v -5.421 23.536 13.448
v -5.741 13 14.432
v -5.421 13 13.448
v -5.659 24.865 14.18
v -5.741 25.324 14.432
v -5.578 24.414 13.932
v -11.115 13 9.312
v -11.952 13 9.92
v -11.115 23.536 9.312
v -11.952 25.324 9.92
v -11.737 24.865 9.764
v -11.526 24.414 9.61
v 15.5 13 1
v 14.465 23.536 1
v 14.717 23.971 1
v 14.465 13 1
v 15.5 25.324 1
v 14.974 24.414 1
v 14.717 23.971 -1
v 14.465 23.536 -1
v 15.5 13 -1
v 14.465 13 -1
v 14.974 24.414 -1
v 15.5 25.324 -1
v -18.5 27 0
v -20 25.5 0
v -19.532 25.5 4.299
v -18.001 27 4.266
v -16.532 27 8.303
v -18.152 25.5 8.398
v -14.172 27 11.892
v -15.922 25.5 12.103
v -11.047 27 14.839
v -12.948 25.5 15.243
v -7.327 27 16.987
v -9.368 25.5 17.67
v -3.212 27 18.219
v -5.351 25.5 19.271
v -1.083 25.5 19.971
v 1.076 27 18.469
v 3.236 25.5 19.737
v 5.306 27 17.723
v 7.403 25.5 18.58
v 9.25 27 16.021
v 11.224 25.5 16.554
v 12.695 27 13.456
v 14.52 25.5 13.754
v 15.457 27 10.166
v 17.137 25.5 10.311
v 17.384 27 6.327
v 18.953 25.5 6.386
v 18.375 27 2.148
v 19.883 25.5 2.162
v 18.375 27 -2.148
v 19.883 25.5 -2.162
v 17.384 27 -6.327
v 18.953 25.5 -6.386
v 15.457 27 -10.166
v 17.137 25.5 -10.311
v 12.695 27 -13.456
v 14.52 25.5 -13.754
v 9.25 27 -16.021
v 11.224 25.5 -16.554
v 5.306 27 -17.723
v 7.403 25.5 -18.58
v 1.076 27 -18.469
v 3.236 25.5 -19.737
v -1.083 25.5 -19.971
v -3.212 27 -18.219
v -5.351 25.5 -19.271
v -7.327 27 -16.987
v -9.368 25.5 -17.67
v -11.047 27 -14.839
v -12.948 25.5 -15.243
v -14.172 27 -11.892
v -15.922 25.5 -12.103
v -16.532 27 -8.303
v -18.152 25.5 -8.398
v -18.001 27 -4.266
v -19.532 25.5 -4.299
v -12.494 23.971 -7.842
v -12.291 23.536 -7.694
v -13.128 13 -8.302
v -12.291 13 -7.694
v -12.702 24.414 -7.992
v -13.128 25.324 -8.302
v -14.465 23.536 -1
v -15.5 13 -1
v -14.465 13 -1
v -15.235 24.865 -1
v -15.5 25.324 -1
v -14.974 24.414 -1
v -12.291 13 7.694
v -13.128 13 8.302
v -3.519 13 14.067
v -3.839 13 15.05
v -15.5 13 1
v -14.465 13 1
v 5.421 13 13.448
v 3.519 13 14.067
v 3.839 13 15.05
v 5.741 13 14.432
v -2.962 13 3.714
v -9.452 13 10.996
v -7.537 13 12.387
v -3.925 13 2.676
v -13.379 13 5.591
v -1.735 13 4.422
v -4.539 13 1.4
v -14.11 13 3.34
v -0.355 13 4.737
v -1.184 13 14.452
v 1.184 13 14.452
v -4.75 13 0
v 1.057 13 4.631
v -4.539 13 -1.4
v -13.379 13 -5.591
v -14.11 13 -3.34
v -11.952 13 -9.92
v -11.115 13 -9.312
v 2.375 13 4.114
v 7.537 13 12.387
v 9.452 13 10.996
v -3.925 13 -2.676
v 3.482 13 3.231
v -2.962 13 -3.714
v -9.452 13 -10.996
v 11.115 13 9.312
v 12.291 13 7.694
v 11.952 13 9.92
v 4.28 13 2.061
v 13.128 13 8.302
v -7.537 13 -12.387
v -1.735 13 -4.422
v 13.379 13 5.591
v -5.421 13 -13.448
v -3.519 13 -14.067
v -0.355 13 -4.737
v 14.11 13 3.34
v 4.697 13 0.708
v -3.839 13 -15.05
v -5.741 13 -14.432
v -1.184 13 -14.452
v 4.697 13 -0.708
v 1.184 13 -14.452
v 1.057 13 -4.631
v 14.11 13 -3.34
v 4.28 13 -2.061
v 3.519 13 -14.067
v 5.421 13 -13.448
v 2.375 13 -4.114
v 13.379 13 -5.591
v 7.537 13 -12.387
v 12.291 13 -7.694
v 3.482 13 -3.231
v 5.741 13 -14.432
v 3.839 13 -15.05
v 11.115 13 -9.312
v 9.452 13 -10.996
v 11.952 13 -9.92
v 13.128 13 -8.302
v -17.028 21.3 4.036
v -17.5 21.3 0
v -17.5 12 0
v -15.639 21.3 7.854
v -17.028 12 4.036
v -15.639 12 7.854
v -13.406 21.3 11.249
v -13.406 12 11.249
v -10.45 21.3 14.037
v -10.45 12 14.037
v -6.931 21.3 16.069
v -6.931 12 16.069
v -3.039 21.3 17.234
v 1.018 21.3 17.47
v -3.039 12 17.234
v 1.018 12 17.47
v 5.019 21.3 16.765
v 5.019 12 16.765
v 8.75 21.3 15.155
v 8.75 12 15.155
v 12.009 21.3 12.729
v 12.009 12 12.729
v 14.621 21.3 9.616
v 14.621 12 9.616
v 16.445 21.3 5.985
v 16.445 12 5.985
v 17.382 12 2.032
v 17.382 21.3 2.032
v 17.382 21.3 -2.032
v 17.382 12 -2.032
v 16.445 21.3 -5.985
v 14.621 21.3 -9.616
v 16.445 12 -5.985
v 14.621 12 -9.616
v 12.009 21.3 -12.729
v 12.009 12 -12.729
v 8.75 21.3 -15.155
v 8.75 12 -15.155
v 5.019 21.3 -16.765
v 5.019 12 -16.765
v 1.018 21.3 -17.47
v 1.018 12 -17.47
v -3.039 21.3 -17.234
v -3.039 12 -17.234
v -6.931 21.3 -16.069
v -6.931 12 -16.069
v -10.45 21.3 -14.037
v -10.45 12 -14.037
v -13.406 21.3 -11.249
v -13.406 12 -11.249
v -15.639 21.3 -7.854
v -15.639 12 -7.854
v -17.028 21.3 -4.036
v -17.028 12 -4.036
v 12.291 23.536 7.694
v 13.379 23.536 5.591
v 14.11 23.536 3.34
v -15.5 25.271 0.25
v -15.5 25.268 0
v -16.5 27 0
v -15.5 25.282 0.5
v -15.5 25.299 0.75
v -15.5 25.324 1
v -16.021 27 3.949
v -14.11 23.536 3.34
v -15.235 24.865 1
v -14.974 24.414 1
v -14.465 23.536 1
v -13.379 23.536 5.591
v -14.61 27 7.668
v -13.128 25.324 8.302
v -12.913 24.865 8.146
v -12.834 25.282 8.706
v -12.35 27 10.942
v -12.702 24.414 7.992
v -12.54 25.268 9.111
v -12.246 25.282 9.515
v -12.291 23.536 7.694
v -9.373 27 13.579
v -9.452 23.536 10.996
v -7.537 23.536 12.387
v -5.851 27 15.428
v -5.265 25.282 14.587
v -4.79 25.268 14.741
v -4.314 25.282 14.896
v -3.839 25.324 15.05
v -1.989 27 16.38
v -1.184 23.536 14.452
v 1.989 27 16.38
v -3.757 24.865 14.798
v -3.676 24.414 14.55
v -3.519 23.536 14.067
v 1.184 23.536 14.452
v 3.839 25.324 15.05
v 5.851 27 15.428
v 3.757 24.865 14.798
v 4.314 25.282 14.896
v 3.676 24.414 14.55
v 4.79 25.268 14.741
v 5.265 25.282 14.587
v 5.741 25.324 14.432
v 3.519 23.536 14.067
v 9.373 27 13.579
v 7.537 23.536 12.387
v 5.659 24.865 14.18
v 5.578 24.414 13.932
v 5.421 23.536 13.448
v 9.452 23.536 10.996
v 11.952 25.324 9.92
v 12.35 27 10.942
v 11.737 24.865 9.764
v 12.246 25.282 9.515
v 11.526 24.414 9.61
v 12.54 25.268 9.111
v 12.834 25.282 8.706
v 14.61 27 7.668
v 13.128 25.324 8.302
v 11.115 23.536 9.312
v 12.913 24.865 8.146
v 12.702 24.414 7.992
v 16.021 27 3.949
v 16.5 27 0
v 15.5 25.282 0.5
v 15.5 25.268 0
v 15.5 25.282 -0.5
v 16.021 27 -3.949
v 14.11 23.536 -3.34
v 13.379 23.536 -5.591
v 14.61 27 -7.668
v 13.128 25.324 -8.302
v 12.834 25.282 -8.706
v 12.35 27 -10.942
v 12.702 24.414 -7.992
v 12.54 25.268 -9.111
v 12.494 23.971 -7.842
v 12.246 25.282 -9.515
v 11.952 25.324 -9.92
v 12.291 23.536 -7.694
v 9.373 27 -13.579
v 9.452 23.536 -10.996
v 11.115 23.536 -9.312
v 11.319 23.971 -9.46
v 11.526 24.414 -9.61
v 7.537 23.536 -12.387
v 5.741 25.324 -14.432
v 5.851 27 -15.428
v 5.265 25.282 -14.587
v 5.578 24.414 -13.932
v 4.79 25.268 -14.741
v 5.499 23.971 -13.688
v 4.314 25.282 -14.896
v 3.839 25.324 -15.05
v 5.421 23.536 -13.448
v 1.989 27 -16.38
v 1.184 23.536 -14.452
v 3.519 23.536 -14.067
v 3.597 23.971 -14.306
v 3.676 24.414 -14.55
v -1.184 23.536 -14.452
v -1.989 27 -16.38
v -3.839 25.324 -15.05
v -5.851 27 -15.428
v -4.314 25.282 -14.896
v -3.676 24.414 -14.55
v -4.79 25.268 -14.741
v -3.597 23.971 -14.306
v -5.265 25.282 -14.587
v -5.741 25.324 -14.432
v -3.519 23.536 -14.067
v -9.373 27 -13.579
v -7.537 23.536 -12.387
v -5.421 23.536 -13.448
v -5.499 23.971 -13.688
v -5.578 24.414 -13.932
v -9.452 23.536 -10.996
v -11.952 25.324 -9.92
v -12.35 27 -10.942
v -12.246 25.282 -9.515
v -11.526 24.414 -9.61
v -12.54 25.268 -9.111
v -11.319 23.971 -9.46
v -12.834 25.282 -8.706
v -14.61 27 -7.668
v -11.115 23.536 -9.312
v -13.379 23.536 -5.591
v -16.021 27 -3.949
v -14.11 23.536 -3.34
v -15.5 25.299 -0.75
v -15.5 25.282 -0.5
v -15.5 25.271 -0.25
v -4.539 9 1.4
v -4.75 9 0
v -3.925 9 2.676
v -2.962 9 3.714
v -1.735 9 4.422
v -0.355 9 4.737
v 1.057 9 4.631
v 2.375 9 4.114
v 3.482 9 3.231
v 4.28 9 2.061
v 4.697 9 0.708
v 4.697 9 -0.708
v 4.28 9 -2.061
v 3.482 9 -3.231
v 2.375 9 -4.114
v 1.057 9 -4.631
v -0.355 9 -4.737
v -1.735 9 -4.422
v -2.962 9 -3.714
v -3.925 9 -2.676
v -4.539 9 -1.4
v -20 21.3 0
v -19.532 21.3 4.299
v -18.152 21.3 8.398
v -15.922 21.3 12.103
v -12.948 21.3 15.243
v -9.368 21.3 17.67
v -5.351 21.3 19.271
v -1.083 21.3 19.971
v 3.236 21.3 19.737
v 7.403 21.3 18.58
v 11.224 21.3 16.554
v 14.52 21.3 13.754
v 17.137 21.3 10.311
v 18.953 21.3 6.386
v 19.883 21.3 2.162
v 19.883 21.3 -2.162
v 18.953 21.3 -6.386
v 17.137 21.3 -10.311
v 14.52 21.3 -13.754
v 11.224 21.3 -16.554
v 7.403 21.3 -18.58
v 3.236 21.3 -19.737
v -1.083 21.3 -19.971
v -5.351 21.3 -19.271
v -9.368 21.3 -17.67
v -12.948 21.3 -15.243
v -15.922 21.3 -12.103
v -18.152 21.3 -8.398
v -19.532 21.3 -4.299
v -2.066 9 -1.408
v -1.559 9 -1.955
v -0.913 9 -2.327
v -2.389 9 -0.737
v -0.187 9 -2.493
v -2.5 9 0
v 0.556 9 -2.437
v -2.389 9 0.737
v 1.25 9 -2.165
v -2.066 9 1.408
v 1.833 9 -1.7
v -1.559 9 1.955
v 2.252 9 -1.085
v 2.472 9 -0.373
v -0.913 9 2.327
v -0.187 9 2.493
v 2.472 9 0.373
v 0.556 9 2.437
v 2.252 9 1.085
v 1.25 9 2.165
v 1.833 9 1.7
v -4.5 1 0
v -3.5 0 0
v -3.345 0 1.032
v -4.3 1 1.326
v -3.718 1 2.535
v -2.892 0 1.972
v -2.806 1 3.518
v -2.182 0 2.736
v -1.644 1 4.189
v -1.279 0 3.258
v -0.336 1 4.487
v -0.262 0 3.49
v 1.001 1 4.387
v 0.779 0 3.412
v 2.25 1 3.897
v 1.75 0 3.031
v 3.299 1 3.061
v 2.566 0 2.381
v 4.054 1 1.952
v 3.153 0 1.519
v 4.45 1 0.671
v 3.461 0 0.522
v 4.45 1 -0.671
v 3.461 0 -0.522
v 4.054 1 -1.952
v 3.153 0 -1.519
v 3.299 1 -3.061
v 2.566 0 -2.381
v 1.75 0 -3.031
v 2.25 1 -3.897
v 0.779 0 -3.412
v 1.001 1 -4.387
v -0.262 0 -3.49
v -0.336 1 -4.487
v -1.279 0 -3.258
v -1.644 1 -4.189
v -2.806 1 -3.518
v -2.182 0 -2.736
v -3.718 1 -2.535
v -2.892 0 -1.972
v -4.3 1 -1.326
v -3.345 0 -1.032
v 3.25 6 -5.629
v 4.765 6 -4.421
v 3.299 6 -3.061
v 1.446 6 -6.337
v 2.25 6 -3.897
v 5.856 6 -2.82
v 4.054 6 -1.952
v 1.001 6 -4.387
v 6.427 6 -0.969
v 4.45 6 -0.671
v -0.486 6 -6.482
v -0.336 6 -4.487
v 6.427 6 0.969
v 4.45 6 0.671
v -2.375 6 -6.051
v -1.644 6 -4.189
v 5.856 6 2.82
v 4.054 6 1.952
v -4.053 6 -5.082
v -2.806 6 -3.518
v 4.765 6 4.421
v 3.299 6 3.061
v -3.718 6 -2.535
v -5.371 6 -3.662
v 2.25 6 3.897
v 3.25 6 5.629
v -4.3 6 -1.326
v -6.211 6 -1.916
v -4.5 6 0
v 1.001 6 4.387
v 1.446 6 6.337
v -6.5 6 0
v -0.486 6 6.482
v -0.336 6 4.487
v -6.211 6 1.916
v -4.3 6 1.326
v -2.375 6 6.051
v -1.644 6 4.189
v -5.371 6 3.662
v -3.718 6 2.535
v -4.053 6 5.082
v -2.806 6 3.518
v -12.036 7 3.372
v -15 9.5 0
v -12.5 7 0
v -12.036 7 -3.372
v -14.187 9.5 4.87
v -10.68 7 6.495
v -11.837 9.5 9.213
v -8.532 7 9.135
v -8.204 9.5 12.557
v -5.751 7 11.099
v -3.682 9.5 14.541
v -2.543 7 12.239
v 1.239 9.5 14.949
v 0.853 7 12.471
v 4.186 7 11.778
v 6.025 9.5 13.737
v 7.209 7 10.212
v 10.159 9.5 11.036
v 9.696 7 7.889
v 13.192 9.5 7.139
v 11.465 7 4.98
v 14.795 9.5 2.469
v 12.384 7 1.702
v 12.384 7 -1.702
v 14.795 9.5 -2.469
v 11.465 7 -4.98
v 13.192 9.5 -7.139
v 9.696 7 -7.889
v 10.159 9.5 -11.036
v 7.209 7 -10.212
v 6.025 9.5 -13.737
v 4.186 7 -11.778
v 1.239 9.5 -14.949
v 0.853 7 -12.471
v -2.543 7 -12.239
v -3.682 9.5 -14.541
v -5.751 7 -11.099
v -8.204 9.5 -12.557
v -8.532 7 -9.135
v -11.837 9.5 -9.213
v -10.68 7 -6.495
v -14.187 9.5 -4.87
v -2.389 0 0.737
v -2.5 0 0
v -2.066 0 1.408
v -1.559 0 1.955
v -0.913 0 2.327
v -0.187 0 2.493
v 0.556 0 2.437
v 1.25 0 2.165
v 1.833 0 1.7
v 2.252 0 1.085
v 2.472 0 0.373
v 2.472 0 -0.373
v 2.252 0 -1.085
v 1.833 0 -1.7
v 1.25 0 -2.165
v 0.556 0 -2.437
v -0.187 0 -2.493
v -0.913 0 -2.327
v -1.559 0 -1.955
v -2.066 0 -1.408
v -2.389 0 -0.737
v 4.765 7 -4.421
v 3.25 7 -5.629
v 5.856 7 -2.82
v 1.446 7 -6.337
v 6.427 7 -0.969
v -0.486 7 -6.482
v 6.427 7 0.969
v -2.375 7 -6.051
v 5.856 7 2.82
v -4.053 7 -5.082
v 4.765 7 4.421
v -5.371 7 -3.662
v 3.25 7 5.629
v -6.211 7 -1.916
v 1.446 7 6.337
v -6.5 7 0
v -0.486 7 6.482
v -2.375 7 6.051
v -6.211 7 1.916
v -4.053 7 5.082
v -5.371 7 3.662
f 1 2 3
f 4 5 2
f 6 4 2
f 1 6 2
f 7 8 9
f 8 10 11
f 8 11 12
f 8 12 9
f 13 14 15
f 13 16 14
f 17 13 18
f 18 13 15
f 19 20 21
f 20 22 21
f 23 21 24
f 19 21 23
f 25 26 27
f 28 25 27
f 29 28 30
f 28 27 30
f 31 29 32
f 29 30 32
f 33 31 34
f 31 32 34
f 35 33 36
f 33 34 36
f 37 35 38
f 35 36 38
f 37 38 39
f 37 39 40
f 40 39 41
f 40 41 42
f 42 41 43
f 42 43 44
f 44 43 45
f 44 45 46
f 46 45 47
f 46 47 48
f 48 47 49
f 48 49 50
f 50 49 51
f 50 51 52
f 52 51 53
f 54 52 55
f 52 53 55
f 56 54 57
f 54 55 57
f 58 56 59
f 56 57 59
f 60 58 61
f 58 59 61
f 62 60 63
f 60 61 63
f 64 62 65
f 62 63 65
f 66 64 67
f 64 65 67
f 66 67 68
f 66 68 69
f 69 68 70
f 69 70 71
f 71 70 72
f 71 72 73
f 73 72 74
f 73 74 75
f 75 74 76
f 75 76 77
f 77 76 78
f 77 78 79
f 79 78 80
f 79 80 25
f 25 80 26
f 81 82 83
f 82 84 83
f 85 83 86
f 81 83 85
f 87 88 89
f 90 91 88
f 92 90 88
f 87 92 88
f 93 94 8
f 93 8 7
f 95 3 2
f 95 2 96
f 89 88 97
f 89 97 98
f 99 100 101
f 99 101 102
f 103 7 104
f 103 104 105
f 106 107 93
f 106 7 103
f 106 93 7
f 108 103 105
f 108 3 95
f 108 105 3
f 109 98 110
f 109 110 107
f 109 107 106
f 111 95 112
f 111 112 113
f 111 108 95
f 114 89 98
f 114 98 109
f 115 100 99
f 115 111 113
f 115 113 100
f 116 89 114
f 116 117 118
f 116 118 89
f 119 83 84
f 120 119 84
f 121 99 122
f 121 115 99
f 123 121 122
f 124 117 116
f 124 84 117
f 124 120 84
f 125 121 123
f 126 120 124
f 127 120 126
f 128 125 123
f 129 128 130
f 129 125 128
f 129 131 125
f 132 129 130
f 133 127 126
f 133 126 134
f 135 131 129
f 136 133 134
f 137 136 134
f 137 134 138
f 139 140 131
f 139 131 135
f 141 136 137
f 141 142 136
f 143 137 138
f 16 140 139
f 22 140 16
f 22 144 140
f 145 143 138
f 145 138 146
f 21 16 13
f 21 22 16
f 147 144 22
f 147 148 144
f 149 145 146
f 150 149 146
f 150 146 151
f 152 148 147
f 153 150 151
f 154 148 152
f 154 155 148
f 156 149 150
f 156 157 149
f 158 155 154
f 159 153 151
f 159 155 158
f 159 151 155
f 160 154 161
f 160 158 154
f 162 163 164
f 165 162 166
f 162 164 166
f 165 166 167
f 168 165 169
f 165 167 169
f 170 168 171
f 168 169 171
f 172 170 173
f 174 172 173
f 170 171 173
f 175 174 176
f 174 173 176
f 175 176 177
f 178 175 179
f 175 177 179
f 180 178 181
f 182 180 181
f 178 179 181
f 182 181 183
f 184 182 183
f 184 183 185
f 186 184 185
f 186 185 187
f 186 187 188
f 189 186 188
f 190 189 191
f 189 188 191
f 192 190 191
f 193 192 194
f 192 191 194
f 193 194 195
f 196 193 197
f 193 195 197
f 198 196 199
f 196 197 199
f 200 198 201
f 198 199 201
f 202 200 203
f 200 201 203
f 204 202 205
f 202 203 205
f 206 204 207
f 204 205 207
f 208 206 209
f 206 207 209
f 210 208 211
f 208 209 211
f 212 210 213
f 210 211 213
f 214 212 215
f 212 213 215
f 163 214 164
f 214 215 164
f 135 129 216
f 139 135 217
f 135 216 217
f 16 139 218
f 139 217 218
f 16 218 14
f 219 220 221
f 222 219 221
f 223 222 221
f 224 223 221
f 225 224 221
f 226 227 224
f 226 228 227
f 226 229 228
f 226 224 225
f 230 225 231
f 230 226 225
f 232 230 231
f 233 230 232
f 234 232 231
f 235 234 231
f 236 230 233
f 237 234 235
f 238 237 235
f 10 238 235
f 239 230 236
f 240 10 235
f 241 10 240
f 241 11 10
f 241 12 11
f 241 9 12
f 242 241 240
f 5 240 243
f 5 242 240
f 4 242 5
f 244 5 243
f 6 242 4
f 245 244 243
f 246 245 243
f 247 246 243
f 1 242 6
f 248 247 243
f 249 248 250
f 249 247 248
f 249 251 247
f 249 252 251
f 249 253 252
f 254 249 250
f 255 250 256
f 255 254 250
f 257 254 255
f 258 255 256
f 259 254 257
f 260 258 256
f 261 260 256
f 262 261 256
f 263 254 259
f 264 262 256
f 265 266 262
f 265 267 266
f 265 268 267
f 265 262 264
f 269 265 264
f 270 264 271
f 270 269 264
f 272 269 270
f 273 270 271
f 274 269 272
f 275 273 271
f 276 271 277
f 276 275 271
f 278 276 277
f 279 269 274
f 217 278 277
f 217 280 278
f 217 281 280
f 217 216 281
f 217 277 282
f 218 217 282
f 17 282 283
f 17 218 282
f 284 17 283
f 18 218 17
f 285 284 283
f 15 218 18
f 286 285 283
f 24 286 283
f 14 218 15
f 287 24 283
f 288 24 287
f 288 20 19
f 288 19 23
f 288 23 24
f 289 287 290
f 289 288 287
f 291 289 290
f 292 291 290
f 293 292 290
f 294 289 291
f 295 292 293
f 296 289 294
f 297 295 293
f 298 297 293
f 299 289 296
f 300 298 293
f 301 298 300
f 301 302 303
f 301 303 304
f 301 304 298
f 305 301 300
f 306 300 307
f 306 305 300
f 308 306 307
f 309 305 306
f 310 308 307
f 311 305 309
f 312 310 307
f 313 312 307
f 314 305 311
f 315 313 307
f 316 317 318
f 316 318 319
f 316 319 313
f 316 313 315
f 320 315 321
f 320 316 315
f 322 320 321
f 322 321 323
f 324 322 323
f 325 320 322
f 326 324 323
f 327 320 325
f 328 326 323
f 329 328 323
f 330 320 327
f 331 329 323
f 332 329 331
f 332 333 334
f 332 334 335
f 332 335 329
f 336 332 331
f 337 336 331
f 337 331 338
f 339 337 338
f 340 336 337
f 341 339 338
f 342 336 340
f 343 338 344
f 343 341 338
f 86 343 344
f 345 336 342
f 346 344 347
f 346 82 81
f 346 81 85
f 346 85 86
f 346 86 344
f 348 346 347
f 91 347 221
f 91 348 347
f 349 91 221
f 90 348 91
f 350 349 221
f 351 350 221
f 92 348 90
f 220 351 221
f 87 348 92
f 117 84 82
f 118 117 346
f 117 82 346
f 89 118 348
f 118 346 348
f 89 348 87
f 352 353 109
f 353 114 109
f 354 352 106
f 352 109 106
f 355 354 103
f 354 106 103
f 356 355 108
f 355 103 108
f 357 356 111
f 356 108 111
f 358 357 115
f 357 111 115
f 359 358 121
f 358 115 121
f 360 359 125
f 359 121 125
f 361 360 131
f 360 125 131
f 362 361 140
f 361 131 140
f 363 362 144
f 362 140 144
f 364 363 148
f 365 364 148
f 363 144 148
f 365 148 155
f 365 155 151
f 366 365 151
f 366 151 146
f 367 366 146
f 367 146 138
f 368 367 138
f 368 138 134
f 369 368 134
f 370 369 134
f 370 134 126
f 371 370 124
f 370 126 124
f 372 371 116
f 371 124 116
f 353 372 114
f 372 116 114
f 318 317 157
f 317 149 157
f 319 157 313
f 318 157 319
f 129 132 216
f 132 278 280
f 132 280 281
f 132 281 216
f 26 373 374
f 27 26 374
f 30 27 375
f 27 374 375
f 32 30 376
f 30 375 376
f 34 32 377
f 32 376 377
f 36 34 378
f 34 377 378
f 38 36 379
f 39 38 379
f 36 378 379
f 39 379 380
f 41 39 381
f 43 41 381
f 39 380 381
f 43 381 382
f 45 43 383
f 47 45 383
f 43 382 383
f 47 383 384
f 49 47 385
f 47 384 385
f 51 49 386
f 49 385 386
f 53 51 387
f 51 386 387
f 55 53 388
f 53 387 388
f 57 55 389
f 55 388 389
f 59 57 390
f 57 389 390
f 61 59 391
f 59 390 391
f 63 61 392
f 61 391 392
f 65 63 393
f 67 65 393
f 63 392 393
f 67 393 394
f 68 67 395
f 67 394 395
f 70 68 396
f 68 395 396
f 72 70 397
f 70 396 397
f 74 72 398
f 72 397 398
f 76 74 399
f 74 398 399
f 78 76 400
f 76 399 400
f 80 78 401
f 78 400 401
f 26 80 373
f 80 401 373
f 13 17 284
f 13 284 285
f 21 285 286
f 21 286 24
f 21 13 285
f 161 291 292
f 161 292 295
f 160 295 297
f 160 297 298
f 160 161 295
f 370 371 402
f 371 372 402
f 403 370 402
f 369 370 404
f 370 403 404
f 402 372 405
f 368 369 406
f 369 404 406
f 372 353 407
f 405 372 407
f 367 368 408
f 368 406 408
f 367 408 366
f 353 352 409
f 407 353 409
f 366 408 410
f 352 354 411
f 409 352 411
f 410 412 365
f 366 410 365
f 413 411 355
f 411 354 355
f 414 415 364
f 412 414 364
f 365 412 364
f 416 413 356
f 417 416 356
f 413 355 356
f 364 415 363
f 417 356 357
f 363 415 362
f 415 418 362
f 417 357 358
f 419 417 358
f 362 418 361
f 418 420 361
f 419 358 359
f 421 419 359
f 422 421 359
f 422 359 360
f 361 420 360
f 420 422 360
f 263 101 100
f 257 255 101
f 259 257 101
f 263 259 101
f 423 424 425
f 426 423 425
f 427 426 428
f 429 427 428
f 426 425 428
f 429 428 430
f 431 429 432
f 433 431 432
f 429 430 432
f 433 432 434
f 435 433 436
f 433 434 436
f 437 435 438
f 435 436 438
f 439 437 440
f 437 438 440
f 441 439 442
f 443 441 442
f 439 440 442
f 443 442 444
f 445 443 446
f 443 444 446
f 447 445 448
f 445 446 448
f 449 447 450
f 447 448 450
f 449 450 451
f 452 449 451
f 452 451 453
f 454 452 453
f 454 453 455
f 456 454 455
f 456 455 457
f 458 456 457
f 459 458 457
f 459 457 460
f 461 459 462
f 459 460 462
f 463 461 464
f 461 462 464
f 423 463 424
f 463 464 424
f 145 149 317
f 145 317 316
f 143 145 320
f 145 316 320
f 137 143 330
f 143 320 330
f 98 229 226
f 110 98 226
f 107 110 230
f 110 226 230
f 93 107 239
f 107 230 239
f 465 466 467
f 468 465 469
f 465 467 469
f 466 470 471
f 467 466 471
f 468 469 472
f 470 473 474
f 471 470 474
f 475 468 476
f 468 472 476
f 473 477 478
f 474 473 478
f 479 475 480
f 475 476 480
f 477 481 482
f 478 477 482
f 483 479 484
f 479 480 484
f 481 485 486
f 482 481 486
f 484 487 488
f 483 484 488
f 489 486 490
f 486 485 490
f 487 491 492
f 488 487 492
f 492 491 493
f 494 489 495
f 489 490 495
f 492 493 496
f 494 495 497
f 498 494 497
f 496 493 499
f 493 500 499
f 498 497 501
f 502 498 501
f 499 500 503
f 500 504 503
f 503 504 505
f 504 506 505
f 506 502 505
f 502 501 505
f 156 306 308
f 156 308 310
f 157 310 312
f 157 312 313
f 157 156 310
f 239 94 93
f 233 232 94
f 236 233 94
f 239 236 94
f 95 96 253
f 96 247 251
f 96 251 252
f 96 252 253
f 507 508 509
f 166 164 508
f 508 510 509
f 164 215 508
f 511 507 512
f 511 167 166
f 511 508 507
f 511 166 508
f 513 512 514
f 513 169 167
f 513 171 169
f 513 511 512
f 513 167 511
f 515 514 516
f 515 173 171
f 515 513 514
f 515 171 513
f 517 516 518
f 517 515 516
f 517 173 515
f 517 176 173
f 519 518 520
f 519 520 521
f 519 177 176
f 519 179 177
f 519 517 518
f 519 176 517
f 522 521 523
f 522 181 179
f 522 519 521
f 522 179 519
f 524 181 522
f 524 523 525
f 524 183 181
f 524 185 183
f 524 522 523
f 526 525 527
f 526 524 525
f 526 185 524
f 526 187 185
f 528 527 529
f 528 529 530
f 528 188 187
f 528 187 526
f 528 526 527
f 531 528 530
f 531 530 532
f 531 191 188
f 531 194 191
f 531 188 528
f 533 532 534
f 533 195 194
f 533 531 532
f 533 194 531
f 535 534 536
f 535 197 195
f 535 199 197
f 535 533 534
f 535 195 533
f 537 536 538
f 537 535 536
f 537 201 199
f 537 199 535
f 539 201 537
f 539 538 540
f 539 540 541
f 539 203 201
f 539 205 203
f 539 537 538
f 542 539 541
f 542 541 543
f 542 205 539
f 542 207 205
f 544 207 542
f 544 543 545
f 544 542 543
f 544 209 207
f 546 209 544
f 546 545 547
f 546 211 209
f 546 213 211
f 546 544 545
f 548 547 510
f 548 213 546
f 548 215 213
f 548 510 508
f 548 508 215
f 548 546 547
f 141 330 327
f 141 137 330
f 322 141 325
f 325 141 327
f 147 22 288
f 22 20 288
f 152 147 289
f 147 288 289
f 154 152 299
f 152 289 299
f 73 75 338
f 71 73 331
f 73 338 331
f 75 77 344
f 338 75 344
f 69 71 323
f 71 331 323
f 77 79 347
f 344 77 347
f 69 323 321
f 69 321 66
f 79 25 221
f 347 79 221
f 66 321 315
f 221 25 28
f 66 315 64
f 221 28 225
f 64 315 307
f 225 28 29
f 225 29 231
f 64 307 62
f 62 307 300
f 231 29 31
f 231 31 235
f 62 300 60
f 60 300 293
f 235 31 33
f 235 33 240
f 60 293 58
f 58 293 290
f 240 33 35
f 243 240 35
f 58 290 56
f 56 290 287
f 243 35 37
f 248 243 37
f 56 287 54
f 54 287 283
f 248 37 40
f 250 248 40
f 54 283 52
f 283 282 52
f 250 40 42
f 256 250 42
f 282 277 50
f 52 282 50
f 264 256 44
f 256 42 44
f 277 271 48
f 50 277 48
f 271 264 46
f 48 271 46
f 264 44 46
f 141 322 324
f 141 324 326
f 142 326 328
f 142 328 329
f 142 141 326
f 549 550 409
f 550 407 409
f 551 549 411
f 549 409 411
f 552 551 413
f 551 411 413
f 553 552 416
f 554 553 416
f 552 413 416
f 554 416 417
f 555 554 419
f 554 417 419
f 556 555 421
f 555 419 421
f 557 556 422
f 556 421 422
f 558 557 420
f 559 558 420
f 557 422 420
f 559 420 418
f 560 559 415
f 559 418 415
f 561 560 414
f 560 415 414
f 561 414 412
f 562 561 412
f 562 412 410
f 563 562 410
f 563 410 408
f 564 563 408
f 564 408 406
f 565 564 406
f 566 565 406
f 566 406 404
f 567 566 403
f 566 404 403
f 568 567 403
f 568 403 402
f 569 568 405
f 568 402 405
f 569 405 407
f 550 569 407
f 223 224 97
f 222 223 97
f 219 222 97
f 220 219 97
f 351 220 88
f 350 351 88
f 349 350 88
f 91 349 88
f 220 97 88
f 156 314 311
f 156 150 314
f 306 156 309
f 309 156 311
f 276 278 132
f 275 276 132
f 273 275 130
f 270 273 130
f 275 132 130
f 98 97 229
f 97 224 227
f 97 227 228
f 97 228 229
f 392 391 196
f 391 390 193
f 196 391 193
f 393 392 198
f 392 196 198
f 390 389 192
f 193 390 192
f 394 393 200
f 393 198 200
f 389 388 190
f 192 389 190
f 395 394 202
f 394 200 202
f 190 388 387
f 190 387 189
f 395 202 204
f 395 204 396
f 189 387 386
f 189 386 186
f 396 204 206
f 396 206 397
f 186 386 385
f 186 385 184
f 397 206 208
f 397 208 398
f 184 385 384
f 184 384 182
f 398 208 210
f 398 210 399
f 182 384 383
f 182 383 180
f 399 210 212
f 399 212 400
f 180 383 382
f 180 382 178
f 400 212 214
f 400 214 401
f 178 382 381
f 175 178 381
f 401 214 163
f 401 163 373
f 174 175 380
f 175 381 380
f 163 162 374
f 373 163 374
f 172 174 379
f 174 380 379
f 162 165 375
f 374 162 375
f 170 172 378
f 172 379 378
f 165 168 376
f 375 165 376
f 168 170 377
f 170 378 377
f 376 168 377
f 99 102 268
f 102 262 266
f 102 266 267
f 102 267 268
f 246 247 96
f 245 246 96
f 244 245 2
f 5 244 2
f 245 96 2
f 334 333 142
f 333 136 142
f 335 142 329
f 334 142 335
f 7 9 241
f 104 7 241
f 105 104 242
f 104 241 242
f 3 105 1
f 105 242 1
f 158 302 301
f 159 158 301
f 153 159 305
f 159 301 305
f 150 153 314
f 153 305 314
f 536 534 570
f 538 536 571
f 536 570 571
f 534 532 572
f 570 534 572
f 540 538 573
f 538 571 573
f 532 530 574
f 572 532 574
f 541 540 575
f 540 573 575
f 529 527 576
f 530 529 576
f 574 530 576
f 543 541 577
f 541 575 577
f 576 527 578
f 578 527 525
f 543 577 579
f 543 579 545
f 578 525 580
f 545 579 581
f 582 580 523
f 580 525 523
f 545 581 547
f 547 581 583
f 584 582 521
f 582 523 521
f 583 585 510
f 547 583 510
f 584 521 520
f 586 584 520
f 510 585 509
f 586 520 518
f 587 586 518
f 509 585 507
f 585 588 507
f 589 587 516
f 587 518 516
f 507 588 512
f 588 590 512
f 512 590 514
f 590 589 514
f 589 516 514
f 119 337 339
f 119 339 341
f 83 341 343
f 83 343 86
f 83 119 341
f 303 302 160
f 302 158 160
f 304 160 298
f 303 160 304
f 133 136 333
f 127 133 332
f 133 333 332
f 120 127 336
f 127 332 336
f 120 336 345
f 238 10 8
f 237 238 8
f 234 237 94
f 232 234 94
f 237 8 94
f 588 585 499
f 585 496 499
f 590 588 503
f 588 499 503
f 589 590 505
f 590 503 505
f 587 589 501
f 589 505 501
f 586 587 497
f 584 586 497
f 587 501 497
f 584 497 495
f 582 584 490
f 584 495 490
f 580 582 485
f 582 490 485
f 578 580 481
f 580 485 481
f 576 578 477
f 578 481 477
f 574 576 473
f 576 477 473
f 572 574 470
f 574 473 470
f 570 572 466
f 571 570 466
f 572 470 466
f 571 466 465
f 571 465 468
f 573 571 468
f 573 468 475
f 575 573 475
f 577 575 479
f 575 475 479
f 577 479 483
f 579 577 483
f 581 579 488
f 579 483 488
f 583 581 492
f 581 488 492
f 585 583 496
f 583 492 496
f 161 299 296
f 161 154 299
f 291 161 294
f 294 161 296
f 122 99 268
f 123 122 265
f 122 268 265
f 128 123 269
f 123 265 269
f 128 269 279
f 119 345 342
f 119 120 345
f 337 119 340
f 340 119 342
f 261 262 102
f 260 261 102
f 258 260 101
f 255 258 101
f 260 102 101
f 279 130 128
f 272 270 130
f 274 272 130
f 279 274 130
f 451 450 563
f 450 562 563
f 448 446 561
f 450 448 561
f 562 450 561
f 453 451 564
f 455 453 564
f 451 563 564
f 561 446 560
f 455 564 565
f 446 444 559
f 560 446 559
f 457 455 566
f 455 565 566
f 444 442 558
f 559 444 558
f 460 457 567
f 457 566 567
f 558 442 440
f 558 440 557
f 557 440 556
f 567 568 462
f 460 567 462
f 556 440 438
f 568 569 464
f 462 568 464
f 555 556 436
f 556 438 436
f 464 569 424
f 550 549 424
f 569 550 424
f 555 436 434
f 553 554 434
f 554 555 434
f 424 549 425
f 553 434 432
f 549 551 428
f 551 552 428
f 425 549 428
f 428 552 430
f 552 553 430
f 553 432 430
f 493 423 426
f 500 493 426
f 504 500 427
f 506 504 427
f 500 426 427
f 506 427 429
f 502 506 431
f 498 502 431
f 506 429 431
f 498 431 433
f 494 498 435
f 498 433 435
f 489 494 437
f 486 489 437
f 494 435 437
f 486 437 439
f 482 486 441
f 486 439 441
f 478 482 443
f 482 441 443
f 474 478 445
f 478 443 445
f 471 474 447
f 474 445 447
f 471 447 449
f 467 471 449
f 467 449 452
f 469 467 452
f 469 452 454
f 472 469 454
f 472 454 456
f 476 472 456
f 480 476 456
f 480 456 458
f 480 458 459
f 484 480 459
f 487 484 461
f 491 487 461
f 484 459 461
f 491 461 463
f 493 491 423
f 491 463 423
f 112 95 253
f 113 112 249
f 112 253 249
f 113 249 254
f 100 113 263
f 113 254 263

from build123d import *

# Parameters (mm, degrees)
CHAMFER1_SIZE      = 2
CHAMFER1_SIZE2     = 3.464101615
CHAMFER2_SIZE      = 1.5
SKETCH2_W          = 31
SKETCH2_H          = 2
CUT_EXTRUDE1_DEPTH = 15
CIRPATTERN1_COUNT  = 10
CHAMFER3_SIZE      = 5
CHAMFER4_SIZE      = 1


with BuildPart() as part:
    # Sketch1 → Revolve1 (revolve)
    with BuildSketch(Plane.XY):
        Polygon((-2.5, 0), (-2.5, 9), (-4.75, 9), (-4.75, 13), (-14.5, 13), (-14.5, 27), (-20, 27), (-20, 21.3), (-17.5, 21.3), (-17.5, 7), (-6.5, 7), (-6.5, 6), (-4.5, 6), (-4.5, 0), align=None)
    revolve(axis=Axis((0, 0, 0), (0, 1, 0)))

    # Chamfer1
    chamfer1_edges = [part.edges().sort_by_distance(p)[0] for p in [
        (14.5, 27, 0),
    ]]
    chamfer1_side = [part.faces().sort_by_distance(p)[0] for p in [
        (15.065685425, 27, 0),
    ]]
    chamfer(chamfer1_edges, length=CHAMFER1_SIZE, length2=CHAMFER1_SIZE2, reference=chamfer1_side[0])

    # Chamfer2
    chamfer2_edges = [part.edges().sort_by_distance(p)[0] for p in [
        (20, 27, 0),
    ]]
    chamfer(chamfer2_edges, length=CHAMFER2_SIZE)

    # Sketch2 → Cut-Extrude1 (cut, through all)
    with BuildSketch(Plane(origin=(0, 13, 0), x_dir=(1, 0, 0), z_dir=(0, 1, 0))):
        Rectangle(SKETCH2_W, SKETCH2_H)
    cut_extrude1 = extrude(amount=CUT_EXTRUDE1_DEPTH, mode=Mode.SUBTRACT)

    # CirPattern1: Cut-Extrude1 ×10 about axis
    cirpattern1_axis = Axis((0, 0, 0), (0, 1, 0))
    for i in range(1, CIRPATTERN1_COUNT):
        add(cut_extrude1.rotate(cirpattern1_axis, i * 360 / CIRPATTERN1_COUNT), mode=Mode.SUBTRACT)

    # Chamfer3
    chamfer3_edges = [part.edges().sort_by_distance(p)[0] for p in [
        (17.5, 7, 0),
    ]]
    chamfer(chamfer3_edges, length=CHAMFER3_SIZE)

    # Chamfer4
    chamfer4_edges = [part.edges().sort_by_distance(p)[0] for p in [
        (4.5, 0, 0),
    ]]
    chamfer(chamfer4_edges, length=CHAMFER4_SIZE)


solid = part.part
